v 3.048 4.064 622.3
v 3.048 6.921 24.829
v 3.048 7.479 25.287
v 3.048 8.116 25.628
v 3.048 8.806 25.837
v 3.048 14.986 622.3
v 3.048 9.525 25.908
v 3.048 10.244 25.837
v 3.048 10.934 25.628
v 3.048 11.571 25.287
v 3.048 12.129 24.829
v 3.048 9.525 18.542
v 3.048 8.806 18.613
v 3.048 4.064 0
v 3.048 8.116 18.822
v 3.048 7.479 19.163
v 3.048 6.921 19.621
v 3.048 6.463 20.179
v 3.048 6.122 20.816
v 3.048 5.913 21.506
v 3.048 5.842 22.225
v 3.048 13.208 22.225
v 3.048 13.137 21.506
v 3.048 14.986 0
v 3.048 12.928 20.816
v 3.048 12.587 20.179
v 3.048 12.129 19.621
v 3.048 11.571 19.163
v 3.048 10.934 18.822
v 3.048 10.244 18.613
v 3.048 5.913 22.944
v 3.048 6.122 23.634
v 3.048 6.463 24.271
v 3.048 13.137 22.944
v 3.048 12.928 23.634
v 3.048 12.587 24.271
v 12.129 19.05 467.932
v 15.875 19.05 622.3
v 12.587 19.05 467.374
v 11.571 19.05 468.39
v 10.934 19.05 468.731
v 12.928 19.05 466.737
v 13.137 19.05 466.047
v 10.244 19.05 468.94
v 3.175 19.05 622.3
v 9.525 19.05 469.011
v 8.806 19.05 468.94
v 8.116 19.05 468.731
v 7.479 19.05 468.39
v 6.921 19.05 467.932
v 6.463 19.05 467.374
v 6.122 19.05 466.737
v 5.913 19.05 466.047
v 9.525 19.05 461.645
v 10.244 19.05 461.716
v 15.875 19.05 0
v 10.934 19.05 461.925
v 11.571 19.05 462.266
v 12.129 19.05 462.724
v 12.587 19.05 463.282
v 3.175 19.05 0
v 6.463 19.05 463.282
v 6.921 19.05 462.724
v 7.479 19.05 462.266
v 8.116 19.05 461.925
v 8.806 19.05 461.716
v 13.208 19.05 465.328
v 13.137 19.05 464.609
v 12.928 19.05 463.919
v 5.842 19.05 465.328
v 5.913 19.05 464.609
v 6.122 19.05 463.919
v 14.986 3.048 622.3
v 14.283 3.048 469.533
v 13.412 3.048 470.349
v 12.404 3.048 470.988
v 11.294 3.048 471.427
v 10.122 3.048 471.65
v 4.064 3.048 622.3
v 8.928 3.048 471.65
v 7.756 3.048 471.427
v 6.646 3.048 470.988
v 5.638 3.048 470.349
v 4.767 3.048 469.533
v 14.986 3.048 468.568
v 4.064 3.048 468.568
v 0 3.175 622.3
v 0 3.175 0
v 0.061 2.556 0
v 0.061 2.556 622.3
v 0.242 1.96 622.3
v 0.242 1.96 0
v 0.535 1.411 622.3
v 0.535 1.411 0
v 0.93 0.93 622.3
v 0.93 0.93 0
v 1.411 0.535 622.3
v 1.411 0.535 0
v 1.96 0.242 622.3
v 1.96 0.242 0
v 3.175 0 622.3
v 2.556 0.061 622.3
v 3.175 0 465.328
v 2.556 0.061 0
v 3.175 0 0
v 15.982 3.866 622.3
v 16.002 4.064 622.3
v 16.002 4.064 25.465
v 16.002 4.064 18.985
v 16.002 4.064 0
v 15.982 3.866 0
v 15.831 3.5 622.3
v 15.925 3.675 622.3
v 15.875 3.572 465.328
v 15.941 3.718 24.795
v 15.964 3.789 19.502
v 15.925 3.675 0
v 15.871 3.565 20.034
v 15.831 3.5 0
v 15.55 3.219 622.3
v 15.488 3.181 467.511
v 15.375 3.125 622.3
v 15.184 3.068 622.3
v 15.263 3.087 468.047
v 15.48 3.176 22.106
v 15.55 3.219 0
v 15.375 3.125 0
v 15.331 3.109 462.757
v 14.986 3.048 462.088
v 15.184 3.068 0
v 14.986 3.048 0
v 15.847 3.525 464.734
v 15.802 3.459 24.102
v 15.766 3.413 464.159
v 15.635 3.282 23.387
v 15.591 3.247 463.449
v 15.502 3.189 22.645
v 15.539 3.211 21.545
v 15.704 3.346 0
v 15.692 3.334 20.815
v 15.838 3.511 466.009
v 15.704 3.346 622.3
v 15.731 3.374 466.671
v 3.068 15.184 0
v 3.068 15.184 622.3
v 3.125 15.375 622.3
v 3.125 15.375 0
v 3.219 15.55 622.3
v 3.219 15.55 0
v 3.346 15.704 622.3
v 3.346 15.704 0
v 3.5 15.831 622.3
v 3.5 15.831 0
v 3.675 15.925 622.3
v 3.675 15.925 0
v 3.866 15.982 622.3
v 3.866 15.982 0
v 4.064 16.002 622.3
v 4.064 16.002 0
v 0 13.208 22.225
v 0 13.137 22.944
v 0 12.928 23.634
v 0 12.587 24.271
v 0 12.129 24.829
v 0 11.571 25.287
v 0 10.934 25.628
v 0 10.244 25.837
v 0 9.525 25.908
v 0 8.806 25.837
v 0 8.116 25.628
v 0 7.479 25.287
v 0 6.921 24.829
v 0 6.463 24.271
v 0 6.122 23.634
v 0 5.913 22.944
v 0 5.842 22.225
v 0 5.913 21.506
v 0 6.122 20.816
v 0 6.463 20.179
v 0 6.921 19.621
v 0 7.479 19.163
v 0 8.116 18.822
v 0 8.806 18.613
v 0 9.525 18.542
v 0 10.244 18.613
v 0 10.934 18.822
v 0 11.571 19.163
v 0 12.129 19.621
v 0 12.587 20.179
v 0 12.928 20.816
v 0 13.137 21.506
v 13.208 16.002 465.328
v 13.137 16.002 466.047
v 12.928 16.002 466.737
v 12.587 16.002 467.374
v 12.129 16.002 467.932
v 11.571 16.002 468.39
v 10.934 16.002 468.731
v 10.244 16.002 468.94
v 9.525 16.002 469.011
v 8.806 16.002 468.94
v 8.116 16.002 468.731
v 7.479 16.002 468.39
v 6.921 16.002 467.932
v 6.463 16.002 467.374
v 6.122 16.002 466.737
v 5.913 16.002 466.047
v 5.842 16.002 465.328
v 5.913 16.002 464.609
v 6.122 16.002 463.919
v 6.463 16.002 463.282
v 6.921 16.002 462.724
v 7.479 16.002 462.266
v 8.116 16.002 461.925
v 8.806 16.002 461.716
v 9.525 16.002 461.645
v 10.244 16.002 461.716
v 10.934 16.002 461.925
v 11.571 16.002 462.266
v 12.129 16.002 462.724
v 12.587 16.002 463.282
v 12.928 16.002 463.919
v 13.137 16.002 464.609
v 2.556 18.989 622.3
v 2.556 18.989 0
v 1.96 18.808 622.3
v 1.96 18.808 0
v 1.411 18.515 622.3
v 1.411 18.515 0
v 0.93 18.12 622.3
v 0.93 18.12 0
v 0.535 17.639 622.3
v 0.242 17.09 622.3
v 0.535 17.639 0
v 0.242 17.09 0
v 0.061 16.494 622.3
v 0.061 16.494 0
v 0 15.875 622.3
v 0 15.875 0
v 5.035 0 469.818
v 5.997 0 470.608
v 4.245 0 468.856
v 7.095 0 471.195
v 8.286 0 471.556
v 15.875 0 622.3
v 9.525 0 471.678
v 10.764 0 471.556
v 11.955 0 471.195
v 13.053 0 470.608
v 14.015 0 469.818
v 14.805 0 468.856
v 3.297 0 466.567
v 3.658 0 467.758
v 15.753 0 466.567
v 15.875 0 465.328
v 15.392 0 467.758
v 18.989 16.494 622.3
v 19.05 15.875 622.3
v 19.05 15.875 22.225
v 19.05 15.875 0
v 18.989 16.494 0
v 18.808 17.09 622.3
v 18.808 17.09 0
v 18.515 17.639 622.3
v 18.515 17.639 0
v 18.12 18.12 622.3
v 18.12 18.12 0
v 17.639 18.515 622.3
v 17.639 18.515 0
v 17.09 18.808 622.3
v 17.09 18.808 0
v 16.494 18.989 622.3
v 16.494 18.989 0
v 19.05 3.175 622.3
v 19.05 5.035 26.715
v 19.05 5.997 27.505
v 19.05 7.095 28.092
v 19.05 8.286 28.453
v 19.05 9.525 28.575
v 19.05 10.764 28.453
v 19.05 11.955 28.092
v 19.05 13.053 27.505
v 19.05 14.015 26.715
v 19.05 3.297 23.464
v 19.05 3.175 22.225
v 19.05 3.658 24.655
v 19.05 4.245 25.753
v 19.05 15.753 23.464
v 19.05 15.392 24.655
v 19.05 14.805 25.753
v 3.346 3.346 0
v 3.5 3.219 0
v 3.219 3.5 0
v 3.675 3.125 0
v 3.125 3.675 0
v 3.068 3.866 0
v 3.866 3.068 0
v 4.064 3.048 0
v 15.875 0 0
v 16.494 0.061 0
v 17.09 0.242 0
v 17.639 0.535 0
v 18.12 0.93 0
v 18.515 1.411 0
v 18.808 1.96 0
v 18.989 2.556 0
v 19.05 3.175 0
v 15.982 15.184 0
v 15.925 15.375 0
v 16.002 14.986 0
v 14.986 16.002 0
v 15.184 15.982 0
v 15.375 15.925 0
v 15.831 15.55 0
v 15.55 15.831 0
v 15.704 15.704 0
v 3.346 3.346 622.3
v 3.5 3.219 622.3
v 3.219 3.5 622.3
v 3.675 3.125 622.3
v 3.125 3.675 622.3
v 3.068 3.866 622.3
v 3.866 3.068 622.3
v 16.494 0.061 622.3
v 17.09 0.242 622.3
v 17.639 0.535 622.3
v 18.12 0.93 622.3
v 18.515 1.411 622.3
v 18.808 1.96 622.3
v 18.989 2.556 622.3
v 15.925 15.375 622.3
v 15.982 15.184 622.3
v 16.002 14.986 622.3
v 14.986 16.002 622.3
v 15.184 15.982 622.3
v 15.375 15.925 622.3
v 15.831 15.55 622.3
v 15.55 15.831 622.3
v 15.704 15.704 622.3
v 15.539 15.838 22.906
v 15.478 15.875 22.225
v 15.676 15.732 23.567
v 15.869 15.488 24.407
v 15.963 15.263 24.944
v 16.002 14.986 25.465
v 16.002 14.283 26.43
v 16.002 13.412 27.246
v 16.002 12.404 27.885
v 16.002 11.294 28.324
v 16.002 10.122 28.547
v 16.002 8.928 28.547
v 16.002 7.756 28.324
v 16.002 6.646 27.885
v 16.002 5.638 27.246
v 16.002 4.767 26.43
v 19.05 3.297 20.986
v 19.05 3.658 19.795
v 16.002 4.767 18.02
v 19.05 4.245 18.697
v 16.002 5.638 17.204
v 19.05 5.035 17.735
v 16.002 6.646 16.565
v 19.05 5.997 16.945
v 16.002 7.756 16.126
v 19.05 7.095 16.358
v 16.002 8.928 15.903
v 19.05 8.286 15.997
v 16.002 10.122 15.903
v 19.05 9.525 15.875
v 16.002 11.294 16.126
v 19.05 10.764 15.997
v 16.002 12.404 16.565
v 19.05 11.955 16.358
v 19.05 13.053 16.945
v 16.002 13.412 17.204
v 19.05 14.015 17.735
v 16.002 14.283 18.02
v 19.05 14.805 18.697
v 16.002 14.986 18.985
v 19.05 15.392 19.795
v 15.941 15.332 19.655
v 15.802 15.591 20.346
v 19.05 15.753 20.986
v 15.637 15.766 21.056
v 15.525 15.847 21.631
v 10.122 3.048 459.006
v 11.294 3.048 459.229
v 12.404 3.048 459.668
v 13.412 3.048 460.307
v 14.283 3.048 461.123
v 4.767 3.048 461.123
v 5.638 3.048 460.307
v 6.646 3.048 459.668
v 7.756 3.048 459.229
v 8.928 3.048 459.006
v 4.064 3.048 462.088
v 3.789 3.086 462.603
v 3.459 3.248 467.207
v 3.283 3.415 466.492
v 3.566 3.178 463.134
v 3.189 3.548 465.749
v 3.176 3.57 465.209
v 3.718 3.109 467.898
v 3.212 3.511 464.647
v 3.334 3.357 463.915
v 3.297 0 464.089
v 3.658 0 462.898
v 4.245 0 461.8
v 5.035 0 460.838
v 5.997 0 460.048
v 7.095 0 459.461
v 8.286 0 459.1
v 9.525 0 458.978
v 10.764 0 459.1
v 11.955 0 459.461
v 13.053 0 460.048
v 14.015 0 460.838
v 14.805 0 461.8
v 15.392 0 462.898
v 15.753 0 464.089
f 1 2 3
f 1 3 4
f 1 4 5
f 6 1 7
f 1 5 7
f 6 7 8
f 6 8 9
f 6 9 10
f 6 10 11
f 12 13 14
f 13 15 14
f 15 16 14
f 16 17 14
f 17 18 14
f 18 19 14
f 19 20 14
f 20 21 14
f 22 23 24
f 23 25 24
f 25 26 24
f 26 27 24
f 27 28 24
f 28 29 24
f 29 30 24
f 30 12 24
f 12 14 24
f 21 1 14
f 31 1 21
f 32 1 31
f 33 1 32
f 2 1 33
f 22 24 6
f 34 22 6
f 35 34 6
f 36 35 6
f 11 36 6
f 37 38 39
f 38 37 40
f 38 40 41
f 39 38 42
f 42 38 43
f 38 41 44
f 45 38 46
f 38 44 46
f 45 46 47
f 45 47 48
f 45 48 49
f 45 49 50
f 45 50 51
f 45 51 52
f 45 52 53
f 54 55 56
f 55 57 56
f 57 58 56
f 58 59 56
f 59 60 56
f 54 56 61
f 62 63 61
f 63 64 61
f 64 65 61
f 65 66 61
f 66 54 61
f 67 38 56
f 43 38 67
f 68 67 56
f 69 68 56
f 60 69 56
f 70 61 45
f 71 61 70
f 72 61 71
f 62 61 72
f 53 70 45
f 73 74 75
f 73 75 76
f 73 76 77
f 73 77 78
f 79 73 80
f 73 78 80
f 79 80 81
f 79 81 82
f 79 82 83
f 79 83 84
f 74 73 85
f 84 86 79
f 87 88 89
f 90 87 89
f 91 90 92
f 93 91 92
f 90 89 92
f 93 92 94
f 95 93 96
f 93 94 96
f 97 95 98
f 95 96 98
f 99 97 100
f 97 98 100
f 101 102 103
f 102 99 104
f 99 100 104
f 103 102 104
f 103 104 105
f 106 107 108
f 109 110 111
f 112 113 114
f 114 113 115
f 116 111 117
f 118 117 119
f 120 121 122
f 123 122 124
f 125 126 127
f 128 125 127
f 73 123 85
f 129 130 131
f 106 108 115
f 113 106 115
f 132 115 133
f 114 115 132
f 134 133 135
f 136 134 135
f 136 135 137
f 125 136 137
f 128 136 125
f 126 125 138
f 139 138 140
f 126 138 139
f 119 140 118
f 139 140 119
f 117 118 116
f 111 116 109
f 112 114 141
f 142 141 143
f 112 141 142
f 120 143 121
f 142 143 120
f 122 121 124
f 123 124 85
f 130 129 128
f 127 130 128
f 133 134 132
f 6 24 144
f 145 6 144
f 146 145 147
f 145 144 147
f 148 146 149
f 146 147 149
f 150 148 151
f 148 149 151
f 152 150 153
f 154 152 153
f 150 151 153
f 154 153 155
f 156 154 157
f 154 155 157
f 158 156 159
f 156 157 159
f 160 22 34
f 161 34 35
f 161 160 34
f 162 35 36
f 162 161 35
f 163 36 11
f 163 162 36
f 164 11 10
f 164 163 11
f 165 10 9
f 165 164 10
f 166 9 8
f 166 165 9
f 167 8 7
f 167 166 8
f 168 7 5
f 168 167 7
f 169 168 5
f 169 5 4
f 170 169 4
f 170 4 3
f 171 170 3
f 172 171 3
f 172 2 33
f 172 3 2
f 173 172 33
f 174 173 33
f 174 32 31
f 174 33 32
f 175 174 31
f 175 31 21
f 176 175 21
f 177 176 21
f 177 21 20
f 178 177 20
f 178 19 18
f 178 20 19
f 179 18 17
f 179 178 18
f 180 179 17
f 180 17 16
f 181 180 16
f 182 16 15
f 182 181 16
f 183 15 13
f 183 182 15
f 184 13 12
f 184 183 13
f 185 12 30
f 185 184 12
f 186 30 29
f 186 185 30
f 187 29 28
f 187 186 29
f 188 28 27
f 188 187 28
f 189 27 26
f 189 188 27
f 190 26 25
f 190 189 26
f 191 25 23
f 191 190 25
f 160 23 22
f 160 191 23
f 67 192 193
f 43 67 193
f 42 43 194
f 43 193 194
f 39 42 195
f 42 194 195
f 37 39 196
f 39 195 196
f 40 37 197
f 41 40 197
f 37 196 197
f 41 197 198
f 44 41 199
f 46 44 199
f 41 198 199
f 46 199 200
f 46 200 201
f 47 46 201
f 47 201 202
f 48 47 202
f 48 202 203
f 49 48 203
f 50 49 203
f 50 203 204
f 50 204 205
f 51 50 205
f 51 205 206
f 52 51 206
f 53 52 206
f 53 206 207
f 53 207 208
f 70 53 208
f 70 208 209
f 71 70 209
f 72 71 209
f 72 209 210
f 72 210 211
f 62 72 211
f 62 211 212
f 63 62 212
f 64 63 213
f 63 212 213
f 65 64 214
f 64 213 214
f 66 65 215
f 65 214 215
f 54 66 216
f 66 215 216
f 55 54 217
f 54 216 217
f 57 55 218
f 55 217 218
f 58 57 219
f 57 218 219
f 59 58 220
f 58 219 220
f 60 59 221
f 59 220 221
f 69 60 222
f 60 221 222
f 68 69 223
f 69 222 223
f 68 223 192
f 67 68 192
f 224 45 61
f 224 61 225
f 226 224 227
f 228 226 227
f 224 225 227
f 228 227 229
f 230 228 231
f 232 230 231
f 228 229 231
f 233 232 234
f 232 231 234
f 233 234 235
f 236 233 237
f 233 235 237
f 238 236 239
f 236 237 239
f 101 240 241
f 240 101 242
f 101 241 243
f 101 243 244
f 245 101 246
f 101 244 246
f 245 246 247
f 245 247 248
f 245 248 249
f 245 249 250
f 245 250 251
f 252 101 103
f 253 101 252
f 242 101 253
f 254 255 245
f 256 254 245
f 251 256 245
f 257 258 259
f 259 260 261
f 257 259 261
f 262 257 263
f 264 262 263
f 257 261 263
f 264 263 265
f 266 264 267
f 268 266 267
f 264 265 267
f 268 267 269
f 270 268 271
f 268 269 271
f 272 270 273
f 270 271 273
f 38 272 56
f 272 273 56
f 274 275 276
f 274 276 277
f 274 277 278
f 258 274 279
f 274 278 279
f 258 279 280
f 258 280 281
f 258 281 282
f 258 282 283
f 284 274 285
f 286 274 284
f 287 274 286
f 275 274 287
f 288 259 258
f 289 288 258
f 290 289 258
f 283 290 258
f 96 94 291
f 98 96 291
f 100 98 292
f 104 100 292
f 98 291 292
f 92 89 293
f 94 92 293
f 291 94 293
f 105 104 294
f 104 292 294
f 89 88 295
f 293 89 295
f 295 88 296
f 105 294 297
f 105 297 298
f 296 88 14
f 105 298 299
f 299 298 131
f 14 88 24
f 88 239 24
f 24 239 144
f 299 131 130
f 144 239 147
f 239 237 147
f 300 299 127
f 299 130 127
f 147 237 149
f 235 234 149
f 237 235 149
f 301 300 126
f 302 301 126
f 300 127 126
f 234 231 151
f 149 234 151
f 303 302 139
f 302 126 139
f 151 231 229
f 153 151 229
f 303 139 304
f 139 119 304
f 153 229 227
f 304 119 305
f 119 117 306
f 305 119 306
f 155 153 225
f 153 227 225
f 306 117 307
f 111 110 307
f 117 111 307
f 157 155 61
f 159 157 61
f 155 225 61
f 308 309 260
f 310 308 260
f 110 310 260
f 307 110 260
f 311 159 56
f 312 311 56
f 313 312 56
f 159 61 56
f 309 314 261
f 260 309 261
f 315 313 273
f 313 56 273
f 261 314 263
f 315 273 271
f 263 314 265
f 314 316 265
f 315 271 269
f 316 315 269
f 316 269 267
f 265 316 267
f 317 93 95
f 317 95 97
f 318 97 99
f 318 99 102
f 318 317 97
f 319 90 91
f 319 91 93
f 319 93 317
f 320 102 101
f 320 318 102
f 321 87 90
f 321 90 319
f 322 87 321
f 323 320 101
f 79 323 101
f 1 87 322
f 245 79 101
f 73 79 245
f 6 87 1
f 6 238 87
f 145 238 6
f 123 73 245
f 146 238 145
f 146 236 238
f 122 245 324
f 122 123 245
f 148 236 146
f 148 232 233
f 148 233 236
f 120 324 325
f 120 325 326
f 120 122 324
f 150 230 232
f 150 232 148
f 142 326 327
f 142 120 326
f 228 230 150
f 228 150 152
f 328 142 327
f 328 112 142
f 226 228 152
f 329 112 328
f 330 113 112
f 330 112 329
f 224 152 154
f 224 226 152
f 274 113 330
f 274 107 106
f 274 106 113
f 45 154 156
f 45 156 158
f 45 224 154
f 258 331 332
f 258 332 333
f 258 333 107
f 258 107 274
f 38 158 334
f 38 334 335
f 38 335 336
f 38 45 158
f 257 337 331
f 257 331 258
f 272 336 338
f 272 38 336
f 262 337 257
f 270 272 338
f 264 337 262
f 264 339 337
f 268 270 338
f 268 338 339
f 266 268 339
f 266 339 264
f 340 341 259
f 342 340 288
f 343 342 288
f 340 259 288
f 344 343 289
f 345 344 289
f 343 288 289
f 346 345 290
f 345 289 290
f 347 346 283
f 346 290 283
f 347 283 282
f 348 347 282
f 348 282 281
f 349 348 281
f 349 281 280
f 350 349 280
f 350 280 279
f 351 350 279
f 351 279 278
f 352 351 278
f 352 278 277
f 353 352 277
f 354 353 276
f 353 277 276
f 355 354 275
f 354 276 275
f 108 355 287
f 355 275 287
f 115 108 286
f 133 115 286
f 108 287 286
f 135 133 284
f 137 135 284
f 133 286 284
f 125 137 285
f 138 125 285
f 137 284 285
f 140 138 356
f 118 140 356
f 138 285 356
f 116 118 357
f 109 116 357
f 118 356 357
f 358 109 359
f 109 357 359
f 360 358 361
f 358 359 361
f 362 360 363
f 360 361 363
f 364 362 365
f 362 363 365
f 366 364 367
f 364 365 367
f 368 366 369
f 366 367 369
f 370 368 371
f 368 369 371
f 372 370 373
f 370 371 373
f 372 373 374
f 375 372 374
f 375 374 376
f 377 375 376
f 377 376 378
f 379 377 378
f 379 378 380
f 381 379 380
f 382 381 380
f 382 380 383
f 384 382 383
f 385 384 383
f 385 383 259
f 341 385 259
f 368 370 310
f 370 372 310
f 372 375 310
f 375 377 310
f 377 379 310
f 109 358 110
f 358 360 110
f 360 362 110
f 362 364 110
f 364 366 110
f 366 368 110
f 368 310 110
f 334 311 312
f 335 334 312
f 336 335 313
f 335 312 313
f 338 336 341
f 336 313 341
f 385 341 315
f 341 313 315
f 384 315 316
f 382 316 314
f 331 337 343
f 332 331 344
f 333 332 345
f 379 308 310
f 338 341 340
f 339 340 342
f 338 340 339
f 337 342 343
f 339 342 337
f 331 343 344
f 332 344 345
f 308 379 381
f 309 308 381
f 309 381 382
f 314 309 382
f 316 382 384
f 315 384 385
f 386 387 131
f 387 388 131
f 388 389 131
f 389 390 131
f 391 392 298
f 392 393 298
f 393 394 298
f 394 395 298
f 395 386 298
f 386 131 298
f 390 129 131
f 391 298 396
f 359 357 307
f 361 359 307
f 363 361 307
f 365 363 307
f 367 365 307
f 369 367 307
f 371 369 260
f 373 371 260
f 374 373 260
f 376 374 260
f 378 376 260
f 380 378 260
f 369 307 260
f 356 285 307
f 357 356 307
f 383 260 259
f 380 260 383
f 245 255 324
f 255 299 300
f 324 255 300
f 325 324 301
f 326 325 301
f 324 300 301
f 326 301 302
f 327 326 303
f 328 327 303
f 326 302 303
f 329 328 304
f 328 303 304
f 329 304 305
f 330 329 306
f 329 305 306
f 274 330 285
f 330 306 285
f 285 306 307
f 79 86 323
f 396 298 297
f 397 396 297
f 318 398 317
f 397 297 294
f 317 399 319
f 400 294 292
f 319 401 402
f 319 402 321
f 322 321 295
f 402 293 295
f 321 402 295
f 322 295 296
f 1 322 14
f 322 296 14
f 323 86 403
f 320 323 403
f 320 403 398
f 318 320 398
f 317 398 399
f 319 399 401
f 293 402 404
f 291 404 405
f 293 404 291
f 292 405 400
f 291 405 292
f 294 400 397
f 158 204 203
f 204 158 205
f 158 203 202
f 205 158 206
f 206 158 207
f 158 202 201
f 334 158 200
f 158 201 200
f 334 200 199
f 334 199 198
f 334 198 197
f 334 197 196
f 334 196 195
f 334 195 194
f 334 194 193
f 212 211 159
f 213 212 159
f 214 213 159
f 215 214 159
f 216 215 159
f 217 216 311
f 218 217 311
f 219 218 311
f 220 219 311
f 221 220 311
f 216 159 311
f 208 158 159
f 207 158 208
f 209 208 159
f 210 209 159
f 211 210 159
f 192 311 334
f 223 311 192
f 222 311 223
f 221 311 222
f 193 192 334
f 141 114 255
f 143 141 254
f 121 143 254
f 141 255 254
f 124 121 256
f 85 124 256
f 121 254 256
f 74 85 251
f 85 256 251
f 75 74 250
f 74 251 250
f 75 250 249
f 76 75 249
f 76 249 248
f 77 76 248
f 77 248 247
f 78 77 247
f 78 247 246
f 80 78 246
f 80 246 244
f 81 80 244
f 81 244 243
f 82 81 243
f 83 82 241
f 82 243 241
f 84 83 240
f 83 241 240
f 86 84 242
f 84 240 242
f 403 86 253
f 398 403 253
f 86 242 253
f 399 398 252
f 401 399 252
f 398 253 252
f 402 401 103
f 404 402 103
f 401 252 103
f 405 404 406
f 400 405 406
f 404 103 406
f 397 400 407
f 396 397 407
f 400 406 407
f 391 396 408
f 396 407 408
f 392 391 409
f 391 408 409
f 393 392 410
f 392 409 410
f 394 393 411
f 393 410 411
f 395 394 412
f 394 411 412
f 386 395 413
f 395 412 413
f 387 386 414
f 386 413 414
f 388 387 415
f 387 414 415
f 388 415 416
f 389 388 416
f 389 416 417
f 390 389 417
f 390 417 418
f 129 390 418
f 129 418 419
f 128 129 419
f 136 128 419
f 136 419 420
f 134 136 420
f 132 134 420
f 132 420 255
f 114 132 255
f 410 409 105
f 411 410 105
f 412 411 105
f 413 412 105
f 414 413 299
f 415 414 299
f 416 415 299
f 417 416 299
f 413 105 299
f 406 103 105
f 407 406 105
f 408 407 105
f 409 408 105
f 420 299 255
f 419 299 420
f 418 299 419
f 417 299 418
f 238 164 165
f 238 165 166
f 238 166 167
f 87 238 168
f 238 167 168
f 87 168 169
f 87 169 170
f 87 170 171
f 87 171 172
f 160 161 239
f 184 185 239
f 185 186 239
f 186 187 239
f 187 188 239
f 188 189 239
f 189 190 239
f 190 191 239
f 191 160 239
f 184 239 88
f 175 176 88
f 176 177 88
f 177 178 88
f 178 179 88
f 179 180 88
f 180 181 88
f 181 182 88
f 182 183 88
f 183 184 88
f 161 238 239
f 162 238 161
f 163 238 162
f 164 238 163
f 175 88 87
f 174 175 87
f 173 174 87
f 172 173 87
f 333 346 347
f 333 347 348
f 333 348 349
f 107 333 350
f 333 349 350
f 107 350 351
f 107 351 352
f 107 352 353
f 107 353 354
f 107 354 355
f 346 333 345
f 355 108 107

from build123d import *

# Parameters (mm, degrees)
F1_DEPTH = 622.3
F2_R     = 3.683
F3_DEPTH = 47.498
F4_R     = 6.35
F5_DEPTH = 4.064
F6_R     = 3.683
F7_DEPTH = 25.4
F8_R     = 6.35
F9_DEPTH = 8.636


with BuildPart() as f1:
    # F0 (on Top) → F1 (new body)
    with BuildSketch(Plane.XY):
        with BuildLine():
            ThreePointArc((0, 3.175), (0.929936, 0.929936), (3.175, 0))
            Line((3.175, 0), (15.875, 0))
            ThreePointArc((15.875, 0), (18.120064, 0.929936), (19.05, 3.175))
            Line((19.05, 3.175), (19.05, 15.875))
            ThreePointArc((19.05, 15.875), (18.120064, 18.120064), (15.875, 19.05))
            Line((15.875, 19.05), (3.175, 19.05))
            ThreePointArc((3.175, 19.05), (0.929936, 18.120064), (0, 15.875))
            Line((0, 15.875), (0, 3.175))
        make_face()
        with BuildLine():
            ThreePointArc((3.048, 14.986), (3.34558, 15.70442), (4.064, 16.002))
            Line((4.064, 16.002), (14.986, 16.002))
            ThreePointArc((14.986, 16.002), (15.70442, 15.70442), (16.002, 14.986))
            Line((16.002, 14.986), (16.002, 4.064))
            ThreePointArc((16.002, 4.064), (15.70442, 3.34558), (14.986, 3.048))
            Line((14.986, 3.048), (4.064, 3.048))
            ThreePointArc((4.064, 3.048), (3.34558, 3.34558), (3.048, 4.064))
            Line((3.048, 4.064), (3.048, 14.986))
        make_face(mode=Mode.SUBTRACT)
    extrude(amount=F1_DEPTH)

    # F2 (on Right) → F3 (cut)
    with BuildSketch(Plane.YZ):
        with Locations((9.525, 22.225)):
            Circle(F2_R)
    extrude(amount=F3_DEPTH, mode=Mode.SUBTRACT)

    # F4 (on face) → F5 (cut)
    with BuildSketch(Plane.YZ.offset(19.05)):
        with Locations((9.525, 22.225)):
            Circle(F4_R)
    extrude(amount=-F5_DEPTH, mode=Mode.SUBTRACT)

    # F6 (on Front) → F7 (cut)
    with BuildSketch(Plane.XZ):
        with Locations((9.525, 465.328)):
            Circle(F6_R)
    extrude(amount=-F7_DEPTH, mode=Mode.SUBTRACT)

    # F8 (on face) → F9 (cut)
    with BuildSketch(Plane.XZ):
        with Locations((9.525, 465.328)):
            Circle(F8_R)
    extrude(amount=-F9_DEPTH, mode=Mode.SUBTRACT)


solid = f1.part
